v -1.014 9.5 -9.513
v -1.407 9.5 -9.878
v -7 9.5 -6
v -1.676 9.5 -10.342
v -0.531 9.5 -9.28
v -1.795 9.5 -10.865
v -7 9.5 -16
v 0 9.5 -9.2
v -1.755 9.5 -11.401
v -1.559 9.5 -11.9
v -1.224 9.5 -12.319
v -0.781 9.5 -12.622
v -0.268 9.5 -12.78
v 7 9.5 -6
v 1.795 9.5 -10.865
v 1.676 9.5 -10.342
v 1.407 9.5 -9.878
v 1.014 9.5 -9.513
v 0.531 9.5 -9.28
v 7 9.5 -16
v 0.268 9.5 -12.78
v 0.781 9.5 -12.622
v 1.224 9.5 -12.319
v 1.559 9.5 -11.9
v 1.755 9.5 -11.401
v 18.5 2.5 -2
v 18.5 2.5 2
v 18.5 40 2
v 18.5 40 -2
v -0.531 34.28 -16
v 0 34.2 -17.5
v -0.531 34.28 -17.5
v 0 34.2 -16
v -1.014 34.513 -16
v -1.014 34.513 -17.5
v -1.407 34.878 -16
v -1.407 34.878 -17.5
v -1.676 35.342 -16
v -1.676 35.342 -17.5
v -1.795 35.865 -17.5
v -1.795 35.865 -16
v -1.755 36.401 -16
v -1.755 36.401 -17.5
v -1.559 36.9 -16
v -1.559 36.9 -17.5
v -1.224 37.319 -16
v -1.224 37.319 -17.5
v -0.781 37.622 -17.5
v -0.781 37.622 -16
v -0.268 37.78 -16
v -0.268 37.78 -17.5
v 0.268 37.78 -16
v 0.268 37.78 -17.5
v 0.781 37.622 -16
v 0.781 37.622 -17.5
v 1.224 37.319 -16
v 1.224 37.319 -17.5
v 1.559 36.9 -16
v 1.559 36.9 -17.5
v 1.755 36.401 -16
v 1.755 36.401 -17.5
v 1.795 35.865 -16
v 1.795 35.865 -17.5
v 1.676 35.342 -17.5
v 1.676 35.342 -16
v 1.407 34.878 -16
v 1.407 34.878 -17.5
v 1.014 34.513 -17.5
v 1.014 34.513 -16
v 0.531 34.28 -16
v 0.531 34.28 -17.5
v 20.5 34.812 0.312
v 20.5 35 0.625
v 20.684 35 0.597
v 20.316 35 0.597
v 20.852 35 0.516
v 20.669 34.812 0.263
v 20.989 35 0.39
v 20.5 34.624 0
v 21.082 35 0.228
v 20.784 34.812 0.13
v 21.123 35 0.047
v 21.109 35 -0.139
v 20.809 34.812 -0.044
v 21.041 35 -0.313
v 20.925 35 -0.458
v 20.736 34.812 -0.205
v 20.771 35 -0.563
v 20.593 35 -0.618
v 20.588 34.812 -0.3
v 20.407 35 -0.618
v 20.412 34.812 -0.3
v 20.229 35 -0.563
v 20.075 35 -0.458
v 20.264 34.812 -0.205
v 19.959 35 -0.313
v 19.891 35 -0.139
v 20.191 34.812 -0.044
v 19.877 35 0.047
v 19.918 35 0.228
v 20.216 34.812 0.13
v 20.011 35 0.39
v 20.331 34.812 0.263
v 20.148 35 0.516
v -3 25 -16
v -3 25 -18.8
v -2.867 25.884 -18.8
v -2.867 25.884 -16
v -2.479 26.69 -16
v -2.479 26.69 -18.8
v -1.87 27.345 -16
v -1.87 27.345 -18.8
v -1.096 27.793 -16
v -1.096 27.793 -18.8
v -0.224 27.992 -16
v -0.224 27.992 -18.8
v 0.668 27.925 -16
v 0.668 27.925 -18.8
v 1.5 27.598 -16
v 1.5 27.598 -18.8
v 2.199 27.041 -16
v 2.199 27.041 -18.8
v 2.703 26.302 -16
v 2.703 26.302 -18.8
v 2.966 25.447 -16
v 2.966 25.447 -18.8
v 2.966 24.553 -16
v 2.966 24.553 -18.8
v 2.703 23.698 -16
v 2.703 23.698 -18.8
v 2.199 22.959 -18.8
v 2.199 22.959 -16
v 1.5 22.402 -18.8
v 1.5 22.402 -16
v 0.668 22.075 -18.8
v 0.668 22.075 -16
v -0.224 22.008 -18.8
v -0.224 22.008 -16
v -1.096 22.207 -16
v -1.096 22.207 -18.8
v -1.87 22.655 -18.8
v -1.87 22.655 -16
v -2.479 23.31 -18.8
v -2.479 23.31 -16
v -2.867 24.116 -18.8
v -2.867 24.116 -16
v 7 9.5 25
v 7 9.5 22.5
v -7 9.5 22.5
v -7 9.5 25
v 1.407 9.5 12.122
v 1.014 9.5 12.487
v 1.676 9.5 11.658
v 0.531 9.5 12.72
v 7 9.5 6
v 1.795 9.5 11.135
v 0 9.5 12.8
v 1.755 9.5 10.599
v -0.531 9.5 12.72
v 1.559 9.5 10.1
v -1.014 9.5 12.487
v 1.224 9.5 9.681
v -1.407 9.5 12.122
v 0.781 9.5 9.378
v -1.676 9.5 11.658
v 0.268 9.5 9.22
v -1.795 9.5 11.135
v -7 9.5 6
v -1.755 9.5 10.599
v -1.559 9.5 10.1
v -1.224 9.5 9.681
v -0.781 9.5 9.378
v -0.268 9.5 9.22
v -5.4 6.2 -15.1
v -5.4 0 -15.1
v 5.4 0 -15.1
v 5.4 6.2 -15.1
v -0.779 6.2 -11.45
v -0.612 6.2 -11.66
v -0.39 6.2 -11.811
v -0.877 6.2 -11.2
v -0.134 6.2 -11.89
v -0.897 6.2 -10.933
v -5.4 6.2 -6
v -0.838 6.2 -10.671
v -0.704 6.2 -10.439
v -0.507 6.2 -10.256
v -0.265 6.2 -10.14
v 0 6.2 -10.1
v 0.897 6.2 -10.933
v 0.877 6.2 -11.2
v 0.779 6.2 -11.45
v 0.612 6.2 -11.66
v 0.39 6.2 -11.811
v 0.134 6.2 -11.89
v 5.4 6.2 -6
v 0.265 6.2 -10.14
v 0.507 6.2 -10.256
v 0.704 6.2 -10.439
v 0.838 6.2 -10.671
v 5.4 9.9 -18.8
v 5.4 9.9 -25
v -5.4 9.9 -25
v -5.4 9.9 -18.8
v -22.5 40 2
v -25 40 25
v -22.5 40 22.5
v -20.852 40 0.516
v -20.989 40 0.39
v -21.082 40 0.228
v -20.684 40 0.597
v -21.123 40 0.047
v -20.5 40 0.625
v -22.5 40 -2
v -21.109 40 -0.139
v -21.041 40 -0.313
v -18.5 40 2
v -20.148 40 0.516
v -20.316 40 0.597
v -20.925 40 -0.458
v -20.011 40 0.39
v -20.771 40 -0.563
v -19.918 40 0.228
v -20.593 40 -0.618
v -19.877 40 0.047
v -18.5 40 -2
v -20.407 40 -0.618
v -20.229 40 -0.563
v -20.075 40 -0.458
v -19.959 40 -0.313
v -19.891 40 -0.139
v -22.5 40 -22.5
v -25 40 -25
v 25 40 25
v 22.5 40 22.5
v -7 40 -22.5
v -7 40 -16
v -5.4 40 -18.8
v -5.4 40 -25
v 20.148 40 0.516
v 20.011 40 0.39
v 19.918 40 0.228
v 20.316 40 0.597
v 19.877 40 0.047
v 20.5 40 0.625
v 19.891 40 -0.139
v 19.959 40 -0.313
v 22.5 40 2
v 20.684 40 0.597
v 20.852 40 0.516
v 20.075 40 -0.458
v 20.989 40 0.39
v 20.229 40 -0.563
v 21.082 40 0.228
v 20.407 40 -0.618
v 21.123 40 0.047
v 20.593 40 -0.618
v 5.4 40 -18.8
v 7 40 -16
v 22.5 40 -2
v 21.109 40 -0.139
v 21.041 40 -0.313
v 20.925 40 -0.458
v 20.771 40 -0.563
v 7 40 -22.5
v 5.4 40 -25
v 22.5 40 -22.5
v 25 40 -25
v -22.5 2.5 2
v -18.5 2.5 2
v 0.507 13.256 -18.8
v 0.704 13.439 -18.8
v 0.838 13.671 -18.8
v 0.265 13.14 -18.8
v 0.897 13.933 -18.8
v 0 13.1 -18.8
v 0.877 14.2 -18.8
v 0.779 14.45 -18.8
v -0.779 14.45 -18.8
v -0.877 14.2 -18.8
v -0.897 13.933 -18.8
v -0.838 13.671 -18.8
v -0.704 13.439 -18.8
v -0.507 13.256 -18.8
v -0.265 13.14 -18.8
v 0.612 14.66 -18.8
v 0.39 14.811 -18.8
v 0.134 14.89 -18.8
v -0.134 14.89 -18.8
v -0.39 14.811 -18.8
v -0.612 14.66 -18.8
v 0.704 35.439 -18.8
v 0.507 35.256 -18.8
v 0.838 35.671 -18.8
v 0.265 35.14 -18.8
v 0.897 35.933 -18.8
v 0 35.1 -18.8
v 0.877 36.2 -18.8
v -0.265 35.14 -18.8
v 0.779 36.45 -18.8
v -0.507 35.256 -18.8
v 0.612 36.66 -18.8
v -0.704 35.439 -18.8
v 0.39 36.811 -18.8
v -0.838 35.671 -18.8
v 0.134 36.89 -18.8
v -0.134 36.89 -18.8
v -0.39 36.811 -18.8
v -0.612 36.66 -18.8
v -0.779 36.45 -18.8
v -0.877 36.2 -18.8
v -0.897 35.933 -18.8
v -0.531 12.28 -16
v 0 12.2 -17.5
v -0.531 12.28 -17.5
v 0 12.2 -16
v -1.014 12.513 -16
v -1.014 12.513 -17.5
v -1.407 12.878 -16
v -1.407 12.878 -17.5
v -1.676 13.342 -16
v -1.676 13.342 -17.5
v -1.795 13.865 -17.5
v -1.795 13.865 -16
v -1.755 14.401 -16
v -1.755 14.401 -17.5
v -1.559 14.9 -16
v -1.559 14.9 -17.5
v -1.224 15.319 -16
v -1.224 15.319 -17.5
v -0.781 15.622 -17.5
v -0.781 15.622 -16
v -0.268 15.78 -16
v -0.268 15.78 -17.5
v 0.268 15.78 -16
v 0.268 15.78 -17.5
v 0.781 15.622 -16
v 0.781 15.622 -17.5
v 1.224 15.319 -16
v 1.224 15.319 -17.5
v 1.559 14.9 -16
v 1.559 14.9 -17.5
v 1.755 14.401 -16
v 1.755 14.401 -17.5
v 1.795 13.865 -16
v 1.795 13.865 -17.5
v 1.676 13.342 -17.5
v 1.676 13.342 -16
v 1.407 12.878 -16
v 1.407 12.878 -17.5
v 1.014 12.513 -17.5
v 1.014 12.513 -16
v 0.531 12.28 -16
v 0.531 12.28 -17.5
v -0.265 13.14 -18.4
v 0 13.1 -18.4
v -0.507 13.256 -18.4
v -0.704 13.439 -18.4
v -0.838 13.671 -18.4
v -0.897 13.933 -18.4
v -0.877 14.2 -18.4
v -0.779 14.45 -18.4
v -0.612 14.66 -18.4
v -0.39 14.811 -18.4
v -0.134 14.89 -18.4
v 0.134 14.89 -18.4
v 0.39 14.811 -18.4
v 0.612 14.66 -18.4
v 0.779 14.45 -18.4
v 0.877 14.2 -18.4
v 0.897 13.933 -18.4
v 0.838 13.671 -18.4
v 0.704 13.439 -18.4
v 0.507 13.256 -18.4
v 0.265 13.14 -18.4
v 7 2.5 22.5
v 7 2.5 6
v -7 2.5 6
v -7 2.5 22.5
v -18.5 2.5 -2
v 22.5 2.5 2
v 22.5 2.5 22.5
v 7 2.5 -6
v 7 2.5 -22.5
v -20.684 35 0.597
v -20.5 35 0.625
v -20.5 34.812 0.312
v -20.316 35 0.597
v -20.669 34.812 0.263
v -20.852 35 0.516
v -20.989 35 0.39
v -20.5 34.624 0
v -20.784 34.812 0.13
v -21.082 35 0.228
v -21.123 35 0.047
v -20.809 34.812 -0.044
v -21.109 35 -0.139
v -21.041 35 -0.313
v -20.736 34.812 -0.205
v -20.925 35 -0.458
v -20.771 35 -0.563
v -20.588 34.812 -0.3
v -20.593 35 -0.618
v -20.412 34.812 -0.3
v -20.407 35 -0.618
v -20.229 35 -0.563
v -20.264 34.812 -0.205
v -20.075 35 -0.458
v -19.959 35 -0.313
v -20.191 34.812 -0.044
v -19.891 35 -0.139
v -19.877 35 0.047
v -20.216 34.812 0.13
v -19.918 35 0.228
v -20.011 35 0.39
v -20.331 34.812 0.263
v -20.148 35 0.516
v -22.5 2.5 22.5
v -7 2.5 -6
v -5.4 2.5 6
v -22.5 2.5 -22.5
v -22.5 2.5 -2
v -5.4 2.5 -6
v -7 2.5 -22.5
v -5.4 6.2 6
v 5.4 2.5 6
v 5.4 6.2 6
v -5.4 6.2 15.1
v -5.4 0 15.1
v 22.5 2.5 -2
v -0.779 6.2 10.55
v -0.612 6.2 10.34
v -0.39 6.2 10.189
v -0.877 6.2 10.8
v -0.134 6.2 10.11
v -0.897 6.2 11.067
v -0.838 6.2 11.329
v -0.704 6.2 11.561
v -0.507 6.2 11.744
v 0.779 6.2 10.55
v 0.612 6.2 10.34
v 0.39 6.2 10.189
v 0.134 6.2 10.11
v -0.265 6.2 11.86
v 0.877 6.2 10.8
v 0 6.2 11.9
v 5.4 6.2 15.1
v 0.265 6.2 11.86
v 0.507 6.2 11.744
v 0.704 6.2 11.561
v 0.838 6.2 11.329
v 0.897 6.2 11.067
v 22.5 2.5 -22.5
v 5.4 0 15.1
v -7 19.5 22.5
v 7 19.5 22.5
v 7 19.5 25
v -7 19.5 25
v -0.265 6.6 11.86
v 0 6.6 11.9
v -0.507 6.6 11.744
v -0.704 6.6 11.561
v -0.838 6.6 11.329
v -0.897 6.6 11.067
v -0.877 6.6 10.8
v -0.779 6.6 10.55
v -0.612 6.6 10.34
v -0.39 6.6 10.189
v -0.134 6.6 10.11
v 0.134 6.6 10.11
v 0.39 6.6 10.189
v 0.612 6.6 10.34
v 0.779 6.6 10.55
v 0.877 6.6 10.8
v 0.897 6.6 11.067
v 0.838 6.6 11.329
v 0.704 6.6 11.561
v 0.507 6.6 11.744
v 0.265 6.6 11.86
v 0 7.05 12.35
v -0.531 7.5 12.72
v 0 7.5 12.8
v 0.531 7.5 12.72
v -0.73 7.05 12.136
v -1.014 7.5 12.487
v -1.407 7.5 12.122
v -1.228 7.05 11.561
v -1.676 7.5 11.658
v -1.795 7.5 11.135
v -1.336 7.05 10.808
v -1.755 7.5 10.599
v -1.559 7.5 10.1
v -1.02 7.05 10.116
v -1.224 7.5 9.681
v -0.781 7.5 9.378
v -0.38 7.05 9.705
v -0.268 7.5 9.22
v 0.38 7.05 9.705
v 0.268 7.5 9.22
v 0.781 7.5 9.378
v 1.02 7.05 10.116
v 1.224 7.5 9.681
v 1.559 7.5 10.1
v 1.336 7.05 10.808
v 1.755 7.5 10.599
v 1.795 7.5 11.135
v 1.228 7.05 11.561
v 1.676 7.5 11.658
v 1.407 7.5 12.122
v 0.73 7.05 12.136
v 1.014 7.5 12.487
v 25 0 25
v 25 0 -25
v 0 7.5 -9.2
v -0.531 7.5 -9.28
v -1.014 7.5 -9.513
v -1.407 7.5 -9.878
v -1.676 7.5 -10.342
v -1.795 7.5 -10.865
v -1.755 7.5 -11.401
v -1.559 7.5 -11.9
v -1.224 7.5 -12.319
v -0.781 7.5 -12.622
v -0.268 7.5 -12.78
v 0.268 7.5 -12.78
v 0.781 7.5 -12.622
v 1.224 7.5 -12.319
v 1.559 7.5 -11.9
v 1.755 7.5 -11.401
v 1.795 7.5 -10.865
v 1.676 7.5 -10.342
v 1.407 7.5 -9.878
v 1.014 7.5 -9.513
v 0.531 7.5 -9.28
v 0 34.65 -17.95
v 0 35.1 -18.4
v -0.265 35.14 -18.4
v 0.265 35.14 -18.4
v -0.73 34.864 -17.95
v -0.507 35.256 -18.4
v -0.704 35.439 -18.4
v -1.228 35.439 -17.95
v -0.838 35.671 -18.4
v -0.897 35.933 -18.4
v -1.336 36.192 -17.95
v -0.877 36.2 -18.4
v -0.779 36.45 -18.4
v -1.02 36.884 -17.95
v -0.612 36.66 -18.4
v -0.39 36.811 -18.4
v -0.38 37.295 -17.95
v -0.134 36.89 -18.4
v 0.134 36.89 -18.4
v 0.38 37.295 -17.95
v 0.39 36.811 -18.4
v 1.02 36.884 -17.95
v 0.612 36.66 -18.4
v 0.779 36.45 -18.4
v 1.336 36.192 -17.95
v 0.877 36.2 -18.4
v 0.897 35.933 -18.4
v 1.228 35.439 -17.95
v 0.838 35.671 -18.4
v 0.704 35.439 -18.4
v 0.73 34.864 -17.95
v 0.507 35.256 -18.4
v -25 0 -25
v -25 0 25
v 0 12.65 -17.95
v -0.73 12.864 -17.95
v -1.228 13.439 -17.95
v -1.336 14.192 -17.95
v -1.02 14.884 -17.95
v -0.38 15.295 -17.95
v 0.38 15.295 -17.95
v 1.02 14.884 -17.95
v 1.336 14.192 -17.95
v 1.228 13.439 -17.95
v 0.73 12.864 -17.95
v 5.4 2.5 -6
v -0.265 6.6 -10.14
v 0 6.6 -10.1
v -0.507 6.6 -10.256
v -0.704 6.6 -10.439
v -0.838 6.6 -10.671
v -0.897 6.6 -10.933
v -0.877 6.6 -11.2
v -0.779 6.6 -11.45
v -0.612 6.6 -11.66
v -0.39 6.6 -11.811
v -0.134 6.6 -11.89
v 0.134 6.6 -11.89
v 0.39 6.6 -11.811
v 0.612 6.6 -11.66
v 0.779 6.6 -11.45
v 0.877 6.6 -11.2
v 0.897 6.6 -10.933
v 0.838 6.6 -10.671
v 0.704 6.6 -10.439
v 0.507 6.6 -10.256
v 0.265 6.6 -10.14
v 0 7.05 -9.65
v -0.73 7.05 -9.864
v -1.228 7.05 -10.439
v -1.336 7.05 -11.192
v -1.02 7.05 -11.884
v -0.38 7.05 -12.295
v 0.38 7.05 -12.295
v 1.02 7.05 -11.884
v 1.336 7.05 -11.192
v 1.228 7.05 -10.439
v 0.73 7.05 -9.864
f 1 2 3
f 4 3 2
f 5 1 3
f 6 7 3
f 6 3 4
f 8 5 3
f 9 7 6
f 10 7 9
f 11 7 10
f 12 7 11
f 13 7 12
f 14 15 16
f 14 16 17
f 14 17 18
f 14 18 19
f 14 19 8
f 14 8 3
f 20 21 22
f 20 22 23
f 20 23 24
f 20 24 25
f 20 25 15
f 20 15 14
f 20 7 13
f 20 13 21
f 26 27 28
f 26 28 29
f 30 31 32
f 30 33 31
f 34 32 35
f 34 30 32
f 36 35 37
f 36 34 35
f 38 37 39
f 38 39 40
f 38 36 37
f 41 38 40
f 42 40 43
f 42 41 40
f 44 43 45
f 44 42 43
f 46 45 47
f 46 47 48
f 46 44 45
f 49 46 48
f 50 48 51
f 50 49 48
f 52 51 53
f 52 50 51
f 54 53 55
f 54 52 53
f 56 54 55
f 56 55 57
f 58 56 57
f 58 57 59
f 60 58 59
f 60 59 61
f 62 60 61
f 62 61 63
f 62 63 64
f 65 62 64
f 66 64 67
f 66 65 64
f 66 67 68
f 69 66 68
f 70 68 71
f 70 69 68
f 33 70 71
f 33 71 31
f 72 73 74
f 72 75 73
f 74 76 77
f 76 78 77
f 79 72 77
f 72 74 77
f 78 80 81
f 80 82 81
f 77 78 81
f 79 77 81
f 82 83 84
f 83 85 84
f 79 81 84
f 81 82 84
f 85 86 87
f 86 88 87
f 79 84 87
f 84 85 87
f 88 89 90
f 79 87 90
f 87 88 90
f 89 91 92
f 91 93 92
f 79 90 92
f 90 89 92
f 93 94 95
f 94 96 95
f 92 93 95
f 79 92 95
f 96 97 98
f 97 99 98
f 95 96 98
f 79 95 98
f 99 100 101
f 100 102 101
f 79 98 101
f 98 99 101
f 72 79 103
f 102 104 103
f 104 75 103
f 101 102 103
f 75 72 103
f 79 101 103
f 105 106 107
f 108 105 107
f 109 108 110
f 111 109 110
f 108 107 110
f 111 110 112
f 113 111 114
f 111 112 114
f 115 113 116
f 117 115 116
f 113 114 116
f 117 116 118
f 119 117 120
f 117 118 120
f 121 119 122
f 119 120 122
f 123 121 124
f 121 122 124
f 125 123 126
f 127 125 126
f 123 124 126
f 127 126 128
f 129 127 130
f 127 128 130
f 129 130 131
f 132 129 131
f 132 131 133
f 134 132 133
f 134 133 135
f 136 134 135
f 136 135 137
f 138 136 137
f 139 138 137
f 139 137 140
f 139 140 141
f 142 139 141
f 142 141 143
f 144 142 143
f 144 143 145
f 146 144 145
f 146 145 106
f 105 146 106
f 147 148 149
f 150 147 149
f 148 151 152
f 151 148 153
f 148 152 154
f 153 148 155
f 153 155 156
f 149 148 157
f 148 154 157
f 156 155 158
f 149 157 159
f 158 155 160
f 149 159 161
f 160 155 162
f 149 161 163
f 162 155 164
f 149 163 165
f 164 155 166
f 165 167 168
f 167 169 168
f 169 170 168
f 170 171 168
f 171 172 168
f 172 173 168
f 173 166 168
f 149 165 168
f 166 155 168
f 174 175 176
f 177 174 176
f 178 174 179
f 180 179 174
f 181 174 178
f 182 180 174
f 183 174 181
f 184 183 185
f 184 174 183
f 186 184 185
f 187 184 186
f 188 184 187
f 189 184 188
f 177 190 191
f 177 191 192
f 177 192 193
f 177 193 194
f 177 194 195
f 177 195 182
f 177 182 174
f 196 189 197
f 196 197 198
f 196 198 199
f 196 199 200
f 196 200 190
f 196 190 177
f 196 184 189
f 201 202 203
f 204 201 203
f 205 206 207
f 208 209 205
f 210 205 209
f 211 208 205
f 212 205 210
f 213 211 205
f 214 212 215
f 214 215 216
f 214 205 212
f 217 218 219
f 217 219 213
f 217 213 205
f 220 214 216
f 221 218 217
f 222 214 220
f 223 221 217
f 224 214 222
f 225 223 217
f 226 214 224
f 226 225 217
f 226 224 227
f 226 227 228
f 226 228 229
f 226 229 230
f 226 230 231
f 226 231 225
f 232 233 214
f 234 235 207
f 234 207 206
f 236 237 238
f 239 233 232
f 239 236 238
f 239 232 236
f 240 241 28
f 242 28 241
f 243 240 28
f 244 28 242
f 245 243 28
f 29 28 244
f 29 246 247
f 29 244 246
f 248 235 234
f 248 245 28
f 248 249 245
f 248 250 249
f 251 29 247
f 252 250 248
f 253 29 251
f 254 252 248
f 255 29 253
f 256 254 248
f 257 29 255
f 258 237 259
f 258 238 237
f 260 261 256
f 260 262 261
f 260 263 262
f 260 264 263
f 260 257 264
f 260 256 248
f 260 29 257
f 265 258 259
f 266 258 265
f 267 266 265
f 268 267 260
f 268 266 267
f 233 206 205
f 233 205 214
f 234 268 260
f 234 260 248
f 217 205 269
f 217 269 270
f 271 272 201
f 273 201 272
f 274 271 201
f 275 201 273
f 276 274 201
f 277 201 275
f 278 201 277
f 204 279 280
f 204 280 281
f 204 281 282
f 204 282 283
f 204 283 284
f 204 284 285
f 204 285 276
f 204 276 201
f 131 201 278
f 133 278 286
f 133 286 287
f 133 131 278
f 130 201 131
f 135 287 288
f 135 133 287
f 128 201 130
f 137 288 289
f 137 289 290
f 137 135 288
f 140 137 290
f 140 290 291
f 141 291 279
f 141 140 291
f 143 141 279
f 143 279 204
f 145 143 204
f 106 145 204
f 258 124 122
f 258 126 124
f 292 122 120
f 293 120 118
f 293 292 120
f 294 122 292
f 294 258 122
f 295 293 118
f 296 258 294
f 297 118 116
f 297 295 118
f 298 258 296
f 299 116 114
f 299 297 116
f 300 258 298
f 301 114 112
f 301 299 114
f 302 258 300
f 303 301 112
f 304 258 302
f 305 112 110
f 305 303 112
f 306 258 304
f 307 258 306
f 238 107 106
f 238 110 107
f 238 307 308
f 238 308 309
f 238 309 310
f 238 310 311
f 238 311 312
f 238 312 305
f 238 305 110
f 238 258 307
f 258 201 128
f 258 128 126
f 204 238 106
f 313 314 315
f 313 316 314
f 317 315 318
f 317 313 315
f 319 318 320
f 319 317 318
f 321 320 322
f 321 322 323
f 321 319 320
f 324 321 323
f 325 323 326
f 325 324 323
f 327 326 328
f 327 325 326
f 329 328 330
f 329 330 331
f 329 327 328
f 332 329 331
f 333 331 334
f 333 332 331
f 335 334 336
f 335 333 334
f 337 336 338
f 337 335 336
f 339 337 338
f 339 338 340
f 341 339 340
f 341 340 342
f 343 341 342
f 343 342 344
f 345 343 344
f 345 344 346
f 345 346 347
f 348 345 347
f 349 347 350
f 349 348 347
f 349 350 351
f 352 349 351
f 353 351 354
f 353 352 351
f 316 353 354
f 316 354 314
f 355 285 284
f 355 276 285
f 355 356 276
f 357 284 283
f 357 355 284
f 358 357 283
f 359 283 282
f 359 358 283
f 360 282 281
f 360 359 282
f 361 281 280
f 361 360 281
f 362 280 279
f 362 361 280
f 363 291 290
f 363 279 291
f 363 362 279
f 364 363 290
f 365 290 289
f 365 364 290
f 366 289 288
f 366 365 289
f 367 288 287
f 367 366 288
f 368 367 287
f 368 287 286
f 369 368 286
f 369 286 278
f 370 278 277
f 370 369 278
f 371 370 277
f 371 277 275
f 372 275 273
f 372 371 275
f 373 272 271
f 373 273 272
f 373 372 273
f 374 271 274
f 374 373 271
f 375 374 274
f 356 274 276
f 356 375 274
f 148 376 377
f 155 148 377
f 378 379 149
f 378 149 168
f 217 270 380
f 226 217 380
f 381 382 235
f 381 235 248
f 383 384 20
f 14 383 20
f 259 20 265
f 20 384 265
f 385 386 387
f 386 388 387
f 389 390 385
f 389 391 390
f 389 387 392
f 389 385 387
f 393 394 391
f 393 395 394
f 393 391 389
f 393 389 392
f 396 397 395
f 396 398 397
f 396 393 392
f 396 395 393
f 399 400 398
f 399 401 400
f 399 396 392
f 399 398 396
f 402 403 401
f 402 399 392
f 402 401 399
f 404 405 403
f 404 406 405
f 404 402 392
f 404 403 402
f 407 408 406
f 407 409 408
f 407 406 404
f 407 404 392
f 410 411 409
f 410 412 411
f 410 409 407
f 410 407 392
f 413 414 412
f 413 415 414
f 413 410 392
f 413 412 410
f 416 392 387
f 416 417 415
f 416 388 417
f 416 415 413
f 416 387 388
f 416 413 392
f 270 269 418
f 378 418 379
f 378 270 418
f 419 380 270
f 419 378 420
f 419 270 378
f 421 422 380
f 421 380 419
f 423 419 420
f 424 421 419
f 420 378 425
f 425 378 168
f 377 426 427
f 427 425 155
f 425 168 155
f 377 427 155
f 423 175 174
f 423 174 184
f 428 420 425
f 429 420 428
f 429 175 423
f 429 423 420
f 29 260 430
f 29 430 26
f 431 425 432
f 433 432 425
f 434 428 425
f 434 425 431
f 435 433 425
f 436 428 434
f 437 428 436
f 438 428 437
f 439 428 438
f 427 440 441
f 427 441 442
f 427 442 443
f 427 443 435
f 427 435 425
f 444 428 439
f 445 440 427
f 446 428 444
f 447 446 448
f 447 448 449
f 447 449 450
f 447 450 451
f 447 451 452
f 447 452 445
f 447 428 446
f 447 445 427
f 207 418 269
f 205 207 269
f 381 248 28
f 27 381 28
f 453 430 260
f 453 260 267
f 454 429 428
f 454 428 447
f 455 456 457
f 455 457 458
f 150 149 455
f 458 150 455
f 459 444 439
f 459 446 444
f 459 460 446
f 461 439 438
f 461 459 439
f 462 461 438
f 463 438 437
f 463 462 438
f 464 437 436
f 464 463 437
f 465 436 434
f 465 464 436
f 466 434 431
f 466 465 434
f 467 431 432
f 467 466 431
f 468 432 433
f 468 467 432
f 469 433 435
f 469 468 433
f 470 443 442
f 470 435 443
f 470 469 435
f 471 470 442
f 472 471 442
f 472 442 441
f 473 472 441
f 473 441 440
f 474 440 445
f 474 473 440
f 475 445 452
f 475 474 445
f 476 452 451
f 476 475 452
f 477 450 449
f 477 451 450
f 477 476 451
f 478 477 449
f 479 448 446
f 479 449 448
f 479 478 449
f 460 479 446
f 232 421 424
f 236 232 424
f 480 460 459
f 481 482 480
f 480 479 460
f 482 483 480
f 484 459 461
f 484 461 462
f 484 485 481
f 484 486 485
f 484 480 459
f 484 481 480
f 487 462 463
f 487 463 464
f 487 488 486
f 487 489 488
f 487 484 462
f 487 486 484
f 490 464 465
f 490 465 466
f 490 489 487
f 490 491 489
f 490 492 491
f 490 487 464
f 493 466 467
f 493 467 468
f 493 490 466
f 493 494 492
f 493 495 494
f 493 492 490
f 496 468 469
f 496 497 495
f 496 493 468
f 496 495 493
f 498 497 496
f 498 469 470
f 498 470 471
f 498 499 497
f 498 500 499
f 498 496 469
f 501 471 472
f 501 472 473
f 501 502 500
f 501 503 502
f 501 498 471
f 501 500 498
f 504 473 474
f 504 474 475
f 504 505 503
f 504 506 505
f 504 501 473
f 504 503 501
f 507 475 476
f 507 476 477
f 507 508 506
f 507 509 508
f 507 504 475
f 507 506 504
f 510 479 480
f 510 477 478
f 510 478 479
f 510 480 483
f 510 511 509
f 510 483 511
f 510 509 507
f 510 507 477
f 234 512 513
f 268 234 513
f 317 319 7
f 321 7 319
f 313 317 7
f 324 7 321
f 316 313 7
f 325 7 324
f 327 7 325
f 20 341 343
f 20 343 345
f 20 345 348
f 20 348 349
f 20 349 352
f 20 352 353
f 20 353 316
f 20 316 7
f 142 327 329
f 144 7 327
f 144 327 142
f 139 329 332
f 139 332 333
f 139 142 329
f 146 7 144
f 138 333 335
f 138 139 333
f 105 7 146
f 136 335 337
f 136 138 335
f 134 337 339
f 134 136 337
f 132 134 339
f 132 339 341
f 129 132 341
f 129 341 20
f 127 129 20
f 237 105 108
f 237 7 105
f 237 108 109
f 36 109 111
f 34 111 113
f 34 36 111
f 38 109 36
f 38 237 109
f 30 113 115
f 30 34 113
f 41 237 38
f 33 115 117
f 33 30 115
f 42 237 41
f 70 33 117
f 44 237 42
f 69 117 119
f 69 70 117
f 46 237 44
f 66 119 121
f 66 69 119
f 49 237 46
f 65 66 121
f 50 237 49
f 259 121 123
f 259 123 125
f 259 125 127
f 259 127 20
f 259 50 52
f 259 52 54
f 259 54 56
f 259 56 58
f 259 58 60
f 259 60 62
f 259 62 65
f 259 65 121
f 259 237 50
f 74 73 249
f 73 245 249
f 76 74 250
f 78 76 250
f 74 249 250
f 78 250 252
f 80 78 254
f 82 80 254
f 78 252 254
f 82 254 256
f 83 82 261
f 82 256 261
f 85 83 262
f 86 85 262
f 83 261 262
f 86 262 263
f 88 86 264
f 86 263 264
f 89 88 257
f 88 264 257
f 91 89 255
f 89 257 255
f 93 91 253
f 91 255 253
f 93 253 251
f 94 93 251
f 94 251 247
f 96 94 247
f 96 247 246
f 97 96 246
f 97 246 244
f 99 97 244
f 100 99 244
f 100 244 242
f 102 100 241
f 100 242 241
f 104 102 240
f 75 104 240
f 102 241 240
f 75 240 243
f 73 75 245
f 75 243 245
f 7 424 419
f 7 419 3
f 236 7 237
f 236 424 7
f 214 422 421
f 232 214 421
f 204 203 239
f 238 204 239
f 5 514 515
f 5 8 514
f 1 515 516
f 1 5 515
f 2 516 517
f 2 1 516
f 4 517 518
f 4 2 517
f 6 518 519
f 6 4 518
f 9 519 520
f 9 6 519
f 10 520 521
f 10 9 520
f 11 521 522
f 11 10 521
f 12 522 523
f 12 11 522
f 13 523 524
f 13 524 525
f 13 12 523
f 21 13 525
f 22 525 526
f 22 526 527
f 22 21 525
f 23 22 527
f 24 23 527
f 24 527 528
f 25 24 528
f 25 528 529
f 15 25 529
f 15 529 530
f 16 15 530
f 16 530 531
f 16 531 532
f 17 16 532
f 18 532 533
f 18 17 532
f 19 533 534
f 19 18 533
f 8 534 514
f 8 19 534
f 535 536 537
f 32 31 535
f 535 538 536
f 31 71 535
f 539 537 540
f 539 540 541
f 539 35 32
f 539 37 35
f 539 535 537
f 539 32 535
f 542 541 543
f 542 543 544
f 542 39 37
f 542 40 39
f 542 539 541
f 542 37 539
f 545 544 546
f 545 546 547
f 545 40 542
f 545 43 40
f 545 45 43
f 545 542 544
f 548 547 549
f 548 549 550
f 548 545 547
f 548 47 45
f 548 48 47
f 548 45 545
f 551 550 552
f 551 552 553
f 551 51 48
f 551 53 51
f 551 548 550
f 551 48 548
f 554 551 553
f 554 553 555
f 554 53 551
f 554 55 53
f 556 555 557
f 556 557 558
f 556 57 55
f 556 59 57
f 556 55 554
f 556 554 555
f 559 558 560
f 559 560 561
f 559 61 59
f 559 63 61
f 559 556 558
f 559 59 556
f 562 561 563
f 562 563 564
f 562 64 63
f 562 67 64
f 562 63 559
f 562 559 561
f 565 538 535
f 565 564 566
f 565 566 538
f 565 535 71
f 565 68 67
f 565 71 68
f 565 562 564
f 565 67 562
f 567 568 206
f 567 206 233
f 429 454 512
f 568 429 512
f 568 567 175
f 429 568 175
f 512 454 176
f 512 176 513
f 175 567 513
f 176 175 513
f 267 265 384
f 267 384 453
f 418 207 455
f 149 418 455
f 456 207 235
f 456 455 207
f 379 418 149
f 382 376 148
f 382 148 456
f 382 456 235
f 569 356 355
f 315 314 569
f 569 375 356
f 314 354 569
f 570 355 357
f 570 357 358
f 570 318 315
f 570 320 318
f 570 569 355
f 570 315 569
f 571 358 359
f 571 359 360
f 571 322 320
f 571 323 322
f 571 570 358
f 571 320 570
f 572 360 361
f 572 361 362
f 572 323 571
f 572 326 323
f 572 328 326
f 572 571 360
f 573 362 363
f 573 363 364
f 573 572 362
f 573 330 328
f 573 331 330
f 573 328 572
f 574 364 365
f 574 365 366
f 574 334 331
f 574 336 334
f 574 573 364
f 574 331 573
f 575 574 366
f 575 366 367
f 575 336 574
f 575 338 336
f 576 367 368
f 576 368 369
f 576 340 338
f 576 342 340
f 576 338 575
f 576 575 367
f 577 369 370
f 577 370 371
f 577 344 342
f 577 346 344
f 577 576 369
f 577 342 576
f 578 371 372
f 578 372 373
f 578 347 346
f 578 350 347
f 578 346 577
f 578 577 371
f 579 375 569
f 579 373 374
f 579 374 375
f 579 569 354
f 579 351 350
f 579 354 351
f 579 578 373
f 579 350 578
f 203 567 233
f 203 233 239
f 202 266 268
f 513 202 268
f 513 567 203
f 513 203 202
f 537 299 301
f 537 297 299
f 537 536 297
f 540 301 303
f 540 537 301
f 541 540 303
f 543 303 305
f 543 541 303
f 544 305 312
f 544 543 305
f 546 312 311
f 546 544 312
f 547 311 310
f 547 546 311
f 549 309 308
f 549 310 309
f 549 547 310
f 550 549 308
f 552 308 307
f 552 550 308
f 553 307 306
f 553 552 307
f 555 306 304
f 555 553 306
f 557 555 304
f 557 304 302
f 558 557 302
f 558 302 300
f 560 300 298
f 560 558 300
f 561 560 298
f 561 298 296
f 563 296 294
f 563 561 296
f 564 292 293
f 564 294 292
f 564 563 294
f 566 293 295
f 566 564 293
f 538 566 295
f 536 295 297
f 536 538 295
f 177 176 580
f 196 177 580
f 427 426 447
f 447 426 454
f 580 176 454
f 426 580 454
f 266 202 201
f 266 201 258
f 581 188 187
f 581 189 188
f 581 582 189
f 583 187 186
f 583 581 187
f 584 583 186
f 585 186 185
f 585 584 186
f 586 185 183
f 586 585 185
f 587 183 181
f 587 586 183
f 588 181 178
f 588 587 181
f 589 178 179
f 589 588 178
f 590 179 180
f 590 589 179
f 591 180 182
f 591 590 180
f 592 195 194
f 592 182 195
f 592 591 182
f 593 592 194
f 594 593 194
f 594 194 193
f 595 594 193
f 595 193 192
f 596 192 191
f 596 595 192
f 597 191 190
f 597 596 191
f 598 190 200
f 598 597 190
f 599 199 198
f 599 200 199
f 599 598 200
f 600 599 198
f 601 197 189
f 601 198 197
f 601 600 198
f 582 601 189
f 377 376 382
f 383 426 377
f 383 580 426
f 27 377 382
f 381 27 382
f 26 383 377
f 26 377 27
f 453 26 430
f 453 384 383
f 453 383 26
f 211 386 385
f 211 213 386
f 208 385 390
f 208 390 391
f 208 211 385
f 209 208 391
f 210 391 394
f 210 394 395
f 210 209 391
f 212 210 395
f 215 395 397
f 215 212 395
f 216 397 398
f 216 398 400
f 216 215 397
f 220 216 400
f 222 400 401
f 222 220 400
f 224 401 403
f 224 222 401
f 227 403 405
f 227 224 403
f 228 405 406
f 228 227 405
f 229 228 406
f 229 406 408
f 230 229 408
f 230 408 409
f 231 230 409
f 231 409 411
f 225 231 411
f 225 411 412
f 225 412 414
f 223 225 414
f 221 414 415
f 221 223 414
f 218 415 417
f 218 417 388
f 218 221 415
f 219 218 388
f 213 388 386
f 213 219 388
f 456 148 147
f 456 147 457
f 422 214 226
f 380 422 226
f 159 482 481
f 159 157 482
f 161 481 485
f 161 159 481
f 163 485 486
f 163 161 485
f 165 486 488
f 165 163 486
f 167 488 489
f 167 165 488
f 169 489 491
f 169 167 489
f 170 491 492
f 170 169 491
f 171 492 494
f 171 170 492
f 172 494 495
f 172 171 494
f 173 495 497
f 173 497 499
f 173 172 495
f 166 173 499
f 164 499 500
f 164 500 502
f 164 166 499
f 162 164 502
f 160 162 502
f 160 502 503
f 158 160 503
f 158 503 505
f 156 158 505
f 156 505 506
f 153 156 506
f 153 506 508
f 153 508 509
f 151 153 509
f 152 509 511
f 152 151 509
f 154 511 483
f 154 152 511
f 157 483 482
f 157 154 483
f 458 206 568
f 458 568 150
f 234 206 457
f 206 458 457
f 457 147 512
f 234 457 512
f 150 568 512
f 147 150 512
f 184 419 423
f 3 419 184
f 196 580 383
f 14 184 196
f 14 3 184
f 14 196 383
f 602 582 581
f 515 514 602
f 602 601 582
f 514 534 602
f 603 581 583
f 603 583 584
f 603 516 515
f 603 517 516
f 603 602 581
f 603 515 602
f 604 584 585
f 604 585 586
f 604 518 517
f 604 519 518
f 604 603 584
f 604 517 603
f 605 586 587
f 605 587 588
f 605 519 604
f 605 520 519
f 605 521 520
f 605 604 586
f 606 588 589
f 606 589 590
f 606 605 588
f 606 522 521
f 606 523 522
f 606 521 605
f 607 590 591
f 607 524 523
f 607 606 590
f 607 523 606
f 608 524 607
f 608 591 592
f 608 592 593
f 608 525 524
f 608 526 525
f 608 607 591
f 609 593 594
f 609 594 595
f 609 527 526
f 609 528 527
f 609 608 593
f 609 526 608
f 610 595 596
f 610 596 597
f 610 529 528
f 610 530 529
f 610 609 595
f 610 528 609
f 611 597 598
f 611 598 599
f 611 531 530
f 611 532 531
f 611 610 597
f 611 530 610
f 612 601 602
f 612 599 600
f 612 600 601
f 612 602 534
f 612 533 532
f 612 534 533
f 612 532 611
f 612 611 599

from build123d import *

# Parameters (mm, degrees)
SKETCH1_W                                      = 50
SKETCH1_H                                      = 50
BOSS_EXTRUDE1_DEPTH                            = 40
SHELL1_T                                       = -2.5
SKETCH2_W                                      = 14
SKETCH2_H                                      = 45
BOSS_EXTRUDE2_DEPTH                            = 7
SKETCH4_W                                      = 10.8
SKETCH4_H                                      = 30.2
CUT_EXTRUDE1_DEPTH                             = 6.2
CSK_SLOT_FOR_M1_6_COUNTERSUNK_FLAT_H_2_COUNT   = 2
CSK_SLOT_FOR_M1_6_COUNTERSUNK_FLAT_H_2_PITCH   = 22
CUT_EXTRUDE4_REACH                             = 48.693
SKETCH11_W                                     = 14
SKETCH11_H                                     = 12
SKETCH19_W                                     = 14
SKETCH19_H                                     = 30.5
BOSS_EXTRUDE5_DEPTH                            = 6.5
SKETCH20_W                                     = 10.8
SKETCH20_H                                     = 30.2
CUT_EXTRUDE6_DEPTH                             = 6.2
CSK_SLOT_FOR_M1_6_COUNTERSUNK_FLAT_H_3_A_COUNT = 2
CSK_SLOT_FOR_M1_6_COUNTERSUNK_FLAT_H_3_A_PITCH = 22
SKETCH30_W                                     = 4
SKETCH30_H                                     = 4
BOSS_EXTRUDE6_DEPTH                            = 37.5
CUT_EXTRUDE8_REACH                             = 66.37
SKETCH33_R                                     = 3
SKETCH35_W                                     = 14
SKETCH35_H                                     = 10
CUT_EXTRUDE10_DEPTH                            = 10


with BuildPart() as part:
    # Sketch1 → Boss-Extrude1 (new body)
    with BuildSketch(Plane(origin=(0, 0, 0), x_dir=(1, 0, 0), z_dir=(0, 1, 0))):
        Rectangle(SKETCH1_W, SKETCH1_H)
    extrude(amount=BOSS_EXTRUDE1_DEPTH)

    # Shell1
    shell1_openings = [part.faces().sort_by_distance(p)[0] for p in [
        (0, 40, 0),
    ]]
    offset(amount=SHELL1_T, openings=shell1_openings, kind=Kind.INTERSECTION)

    # Sketch2 → Boss-Extrude2 (add)
    with BuildSketch(Plane(origin=(0, 2.5, 0), x_dir=(1, 0, 0), z_dir=(0, 1, 0))):
        Rectangle(SKETCH2_W, SKETCH2_H)
    extrude(amount=BOSS_EXTRUDE2_DEPTH)

    # Sketch4 → Cut-Extrude1 (cut)
    with BuildSketch(Plane.XZ):
        Rectangle(SKETCH4_W, SKETCH4_H)
    extrude(amount=-CUT_EXTRUDE1_DEPTH, mode=Mode.SUBTRACT)

    # Sketch7 → CSK SLOT for M1.6 Countersunk Flat Head (revolve, cut)
    with BuildSketch(Plane(origin=(0, 9.5, -11), x_dir=(0, 0, 1), z_dir=(1, 0, 0))):
        Polygon((0, 0), (0, 9.5), (0.9, 9.5), (0.9, 2.9), (1.8, 2), (1.8, 0), align=None)
    csk_slot_for_m1_6_countersunk_flat_head = revolve(axis=Axis((0, 15.85, -11), (0, -1, 0)), mode=Mode.SUBTRACT)

    # CSK SLOT for M1.6 Countersunk Flat H 2: CSK SLOT for M1.6 Countersunk Flat Head ×2
    with Locations(*[(0, 0, i * CSK_SLOT_FOR_M1_6_COUNTERSUNK_FLAT_H_2_PITCH) for i in range(1, CSK_SLOT_FOR_M1_6_COUNTERSUNK_FLAT_H_2_COUNT)]):
        add(csk_slot_for_m1_6_countersunk_flat_head, mode=Mode.SUBTRACT)

    # Cut-Extrude4: up to this face of the body (flat: up to its plane)
    cut_extrude4_end = Plane(part.part.faces().sort_by_distance((-14.75, 2.5, 0))[0])
    # Sketch11 → Cut-Extrude4 (cut, up to the picked face)
    with BuildSketch(Plane(origin=(0, 9.5, 0), x_dir=(1, 0, 0), z_dir=(0, 1, 0)), mode=Mode.PRIVATE) as cut_extrude4_sk1:
        Rectangle(SKETCH11_W, SKETCH11_H)
    cut_extrude4_tool1 = split(extrude(cut_extrude4_sk1.sketch, amount=-CUT_EXTRUDE4_REACH, mode=Mode.PRIVATE), bisect_by=cut_extrude4_end, keep=Keep.BOTH, mode=Mode.PRIVATE)
    add(cut_extrude4_tool1.solids().sort_by(Axis((0, 9.5, 0), (0, -1, 0)))[0], mode=Mode.SUBTRACT)

    # Sketch19 → Boss-Extrude5 (add)
    with BuildSketch(Plane.XY.offset(-22.5)):
        with Locations((0, 24.75)):
            Rectangle(SKETCH19_W, SKETCH19_H)
    extrude(amount=BOSS_EXTRUDE5_DEPTH)

    # Sketch20 → Cut-Extrude6 (cut)
    with BuildSketch(Plane(origin=(0, 0, -25), x_dir=(-1, 0, 0), z_dir=(0, 0, -1))):
        with Locations((0, 25)):
            Rectangle(SKETCH20_W, SKETCH20_H)
    extrude(amount=-CUT_EXTRUDE6_DEPTH, mode=Mode.SUBTRACT)

    # Sketch27 → CSK SLOT for M1.6 Countersunk Flat H 3 (revolve, cut)
    with BuildSketch(Plane(origin=(0, 36, -16), x_dir=(0, -1, 0), z_dir=(1, 0, 0))):
        Polygon((0, 0), (0, 40.540774557), (0.9, 40), (0.9, 2.4), (1.8, 1.5), (1.8, 0), align=None)
    csk_slot_for_m1_6_countersunk_flat_h_3 = revolve(axis=Axis((0, 36, -9.65), (0, 0, -1)), mode=Mode.SUBTRACT)

    # CSK SLOT for M1.6 Countersunk Flat H 3 a: CSK SLOT for M1.6 Countersunk Flat H 3 ×2
    with Locations(*[(0, -i * CSK_SLOT_FOR_M1_6_COUNTERSUNK_FLAT_H_3_A_PITCH, 0) for i in range(1, CSK_SLOT_FOR_M1_6_COUNTERSUNK_FLAT_H_3_A_COUNT)]):
        add(csk_slot_for_m1_6_countersunk_flat_h_3, mode=Mode.SUBTRACT)

    # Sketch30 → Boss-Extrude6 (add)
    with BuildSketch(Plane(origin=(0, 2.5, 0), x_dir=(1, 0, 0), z_dir=(0, 1, 0))):
        with Locations((-20.5, 0)):
            Rectangle(SKETCH30_W, SKETCH30_H)
    boss_extrude6 = extrude(amount=BOSS_EXTRUDE6_DEPTH)

    # Sketch32 → M1.6 Tapped Hole2 (revolve, cut)
    with BuildSketch(Plane(origin=(-20.5, 40, 0), x_dir=(0, 0, 1), z_dir=(1, 0, 0))):
        Polygon((0, 0), (0, 5.375537887), (0.625, 5), (0.625, 0), align=None)
    m1_6_tapped_hole2 = revolve(axis=Axis((-20.5, 46.35, 0), (0, -1, 0)), mode=Mode.SUBTRACT)

    # Mirror3: Boss-Extrude6, M1.6 Tapped Hole2 across plane
    add(boss_extrude6.mirror(Plane(origin=(0, 0, 0), x_dir=(0, 0, 1), z_dir=(1, 0, 0))))
    add(m1_6_tapped_hole2.mirror(Plane(origin=(0, 0, 0), x_dir=(0, 0, 1), z_dir=(1, 0, 0))), mode=Mode.SUBTRACT)

    # Sketch33 → Cut-Extrude8 (cut, up to next)
    with BuildSketch(Plane(origin=(0, 0, -18.8), x_dir=(-1, 0, 0), z_dir=(0, 0, -1)), mode=Mode.PRIVATE) as cut_extrude8_sk1:
        with Locations((0, 25)):
            Circle(SKETCH33_R)
    cut_extrude8_tool1 = extrude(cut_extrude8_sk1.sketch, amount=-CUT_EXTRUDE8_REACH, mode=Mode.PRIVATE) & part.part
    add(cut_extrude8_tool1.solids().sort_by_distance((0, 25, -18.8))[0], mode=Mode.SUBTRACT)

    # Sketch35 → Cut-Extrude10 (cut)
    with BuildSketch(Plane(origin=(0, 0, 22.5), x_dir=(-1, 0, 0), z_dir=(0, 0, -1))):
        with Locations((0, 14.5)):
            Rectangle(SKETCH35_W, SKETCH35_H)
    extrude(amount=-CUT_EXTRUDE10_DEPTH, mode=Mode.SUBTRACT)


solid = part.part
